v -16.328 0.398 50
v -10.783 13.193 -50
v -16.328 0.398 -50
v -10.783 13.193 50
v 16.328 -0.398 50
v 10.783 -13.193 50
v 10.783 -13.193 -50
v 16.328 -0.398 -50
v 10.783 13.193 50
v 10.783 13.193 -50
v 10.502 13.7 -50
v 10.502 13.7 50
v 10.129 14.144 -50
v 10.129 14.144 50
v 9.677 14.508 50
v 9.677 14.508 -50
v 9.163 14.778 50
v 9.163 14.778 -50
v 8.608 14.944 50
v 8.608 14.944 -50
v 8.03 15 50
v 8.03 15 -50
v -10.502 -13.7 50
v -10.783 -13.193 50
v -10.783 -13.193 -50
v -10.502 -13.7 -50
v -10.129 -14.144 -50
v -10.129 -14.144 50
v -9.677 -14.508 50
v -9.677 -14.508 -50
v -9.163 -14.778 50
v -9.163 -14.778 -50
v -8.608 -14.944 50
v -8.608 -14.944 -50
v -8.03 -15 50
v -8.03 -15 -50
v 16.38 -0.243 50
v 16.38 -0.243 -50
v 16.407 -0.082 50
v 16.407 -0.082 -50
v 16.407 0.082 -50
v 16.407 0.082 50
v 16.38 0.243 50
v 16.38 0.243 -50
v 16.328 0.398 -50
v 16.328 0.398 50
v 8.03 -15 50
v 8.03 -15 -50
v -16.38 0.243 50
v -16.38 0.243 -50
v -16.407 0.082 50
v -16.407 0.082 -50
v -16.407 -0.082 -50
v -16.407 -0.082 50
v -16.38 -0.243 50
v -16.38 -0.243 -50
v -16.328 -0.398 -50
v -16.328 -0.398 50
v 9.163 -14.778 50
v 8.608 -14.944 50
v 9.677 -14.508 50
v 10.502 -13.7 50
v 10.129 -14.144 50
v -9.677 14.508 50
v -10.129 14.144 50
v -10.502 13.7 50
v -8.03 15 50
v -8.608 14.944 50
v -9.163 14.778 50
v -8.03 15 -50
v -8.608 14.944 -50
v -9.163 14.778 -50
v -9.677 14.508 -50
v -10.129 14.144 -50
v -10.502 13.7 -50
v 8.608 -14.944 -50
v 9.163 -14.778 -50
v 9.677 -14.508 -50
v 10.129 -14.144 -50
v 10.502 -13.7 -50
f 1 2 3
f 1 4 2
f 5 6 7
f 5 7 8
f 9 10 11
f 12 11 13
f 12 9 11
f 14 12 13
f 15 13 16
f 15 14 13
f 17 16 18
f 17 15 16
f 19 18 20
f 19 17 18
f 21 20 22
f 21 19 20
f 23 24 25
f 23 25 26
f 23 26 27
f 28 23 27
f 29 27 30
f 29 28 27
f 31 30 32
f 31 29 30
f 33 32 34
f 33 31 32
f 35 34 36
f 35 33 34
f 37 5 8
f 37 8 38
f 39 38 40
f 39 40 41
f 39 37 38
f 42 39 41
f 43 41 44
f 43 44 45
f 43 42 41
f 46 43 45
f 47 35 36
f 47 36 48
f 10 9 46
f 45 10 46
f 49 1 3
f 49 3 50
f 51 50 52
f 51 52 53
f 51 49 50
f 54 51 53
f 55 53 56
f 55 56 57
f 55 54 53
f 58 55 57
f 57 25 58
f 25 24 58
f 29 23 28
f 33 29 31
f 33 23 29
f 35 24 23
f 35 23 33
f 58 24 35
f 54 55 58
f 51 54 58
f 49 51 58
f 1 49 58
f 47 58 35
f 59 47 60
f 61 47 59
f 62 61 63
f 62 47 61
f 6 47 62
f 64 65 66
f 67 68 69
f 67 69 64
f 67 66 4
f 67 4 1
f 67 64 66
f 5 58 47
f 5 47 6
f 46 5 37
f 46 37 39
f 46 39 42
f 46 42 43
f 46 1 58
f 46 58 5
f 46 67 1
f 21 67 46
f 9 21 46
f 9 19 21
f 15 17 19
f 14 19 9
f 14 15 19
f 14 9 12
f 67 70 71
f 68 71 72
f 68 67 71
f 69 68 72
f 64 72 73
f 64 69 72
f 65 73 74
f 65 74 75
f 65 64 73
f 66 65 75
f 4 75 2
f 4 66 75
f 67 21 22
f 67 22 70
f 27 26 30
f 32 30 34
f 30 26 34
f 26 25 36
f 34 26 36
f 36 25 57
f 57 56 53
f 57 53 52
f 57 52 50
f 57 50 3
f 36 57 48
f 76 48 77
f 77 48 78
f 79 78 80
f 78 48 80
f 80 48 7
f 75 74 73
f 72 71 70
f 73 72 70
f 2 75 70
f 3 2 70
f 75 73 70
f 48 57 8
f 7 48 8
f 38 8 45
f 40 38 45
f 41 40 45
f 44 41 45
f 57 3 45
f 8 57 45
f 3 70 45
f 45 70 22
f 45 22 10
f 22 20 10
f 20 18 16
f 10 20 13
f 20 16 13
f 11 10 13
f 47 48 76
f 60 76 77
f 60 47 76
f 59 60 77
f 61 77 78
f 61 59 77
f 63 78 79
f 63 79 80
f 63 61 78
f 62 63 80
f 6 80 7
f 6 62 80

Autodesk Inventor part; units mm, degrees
ref_plane "YZ Plane" through (0, 0, 0) normal (1, 0, 0) x (0, 1, 0)
ref_plane "XZ Plane" through (0, 0, 0) normal (0, 1, 0) x (-1, 0, 0)
ref_plane "XY Plane" through (0, 0, 0) normal (0, 0, 1) x (1, 0, 0)
sketch "Sketch1" plane through (0, 0, 0) normal (0, 0, 1) x (1, 0, 0)
  line L0 (-16.5, -15) -> (16.5, -15)
  line L1 (16.5, -15) -> (16.5, 15)
  line L2 (16.5, 15) -> (-16.5, 15)
  line L3 (-16.5, 15) -> (-16.5, -15)
  line L4 (-16.5, -15) -> (16.5, 15) construction
  line L5 (16.5, -15) -> (-16.5, 15) construction
  point P0 (0, 0)
  dimension "d0" = 33
  dimension "d1" = 30
extrude "Extrusion1" add sketch "Sketch1" along normal mid plane 100
sketch "Sketch2" plane through (0, 0, 50) normal (0, 0, 1) x (1, 0, 0)
  line L0 (10.7831, 13.1928) -> (16.3277, 0.3976)
  arc A0 (10.7831, 13.1928) -> (8.0304, 15) centre (8.0304, 12) ccw
  line L1 (8.0304, 15) -> (16.5, 15)
  line L2 (16.5, 15) -> (16.5, 0)
  line L3 (-10.7831, 13.1928) -> (-16.3277, 0.3976)
  arc A1 (-8.0304, 15) -> (-10.7831, 13.1928) centre (-8.0304, 12) ccw
  line L4 (-8.0304, 15) -> (-16.5, 15)
  line L5 (-16.5, 15) -> (-16.5, 0)
  line L6 (10.7831, -13.1928) -> (16.3277, -0.3976)
  arc A2 (8.0304, -15) -> (10.7831, -13.1928) centre (8.0304, -12) ccw
  line L7 (8.0304, -15) -> (16.5, -15)
  line L8 (16.5, -15) -> (16.5, 0)
  line L9 (-10.7831, -13.1928) -> (-16.3277, -0.3976)
  arc A3 (-10.7831, -13.1928) -> (-8.0304, -15) centre (-8.0304, -12) ccw
  line L10 (-8.0304, -15) -> (-16.5, -15)
  line L11 (-16.5, -15) -> (-16.5, 0)
  arc A4 (-16.3277, 0.3976) -> (-16.3277, -0.3976) centre (-15.4101, 0) ccw
  arc A5 (16.3277, -0.3976) -> (16.3277, 0.3976) centre (15.4101, 0) ccw
  point P0 (0, 0)
  point P1 (10, 15)
  point P2 (-10, 15)
  point P3 (10, -15)
  point P4 (-10, -15)
  dimension "d10" = 3
  dimension "d11" = 1
extrude "Extrusion2" cut sketch "Sketch2" against normal blind 100
properties part number "Powerbank"
